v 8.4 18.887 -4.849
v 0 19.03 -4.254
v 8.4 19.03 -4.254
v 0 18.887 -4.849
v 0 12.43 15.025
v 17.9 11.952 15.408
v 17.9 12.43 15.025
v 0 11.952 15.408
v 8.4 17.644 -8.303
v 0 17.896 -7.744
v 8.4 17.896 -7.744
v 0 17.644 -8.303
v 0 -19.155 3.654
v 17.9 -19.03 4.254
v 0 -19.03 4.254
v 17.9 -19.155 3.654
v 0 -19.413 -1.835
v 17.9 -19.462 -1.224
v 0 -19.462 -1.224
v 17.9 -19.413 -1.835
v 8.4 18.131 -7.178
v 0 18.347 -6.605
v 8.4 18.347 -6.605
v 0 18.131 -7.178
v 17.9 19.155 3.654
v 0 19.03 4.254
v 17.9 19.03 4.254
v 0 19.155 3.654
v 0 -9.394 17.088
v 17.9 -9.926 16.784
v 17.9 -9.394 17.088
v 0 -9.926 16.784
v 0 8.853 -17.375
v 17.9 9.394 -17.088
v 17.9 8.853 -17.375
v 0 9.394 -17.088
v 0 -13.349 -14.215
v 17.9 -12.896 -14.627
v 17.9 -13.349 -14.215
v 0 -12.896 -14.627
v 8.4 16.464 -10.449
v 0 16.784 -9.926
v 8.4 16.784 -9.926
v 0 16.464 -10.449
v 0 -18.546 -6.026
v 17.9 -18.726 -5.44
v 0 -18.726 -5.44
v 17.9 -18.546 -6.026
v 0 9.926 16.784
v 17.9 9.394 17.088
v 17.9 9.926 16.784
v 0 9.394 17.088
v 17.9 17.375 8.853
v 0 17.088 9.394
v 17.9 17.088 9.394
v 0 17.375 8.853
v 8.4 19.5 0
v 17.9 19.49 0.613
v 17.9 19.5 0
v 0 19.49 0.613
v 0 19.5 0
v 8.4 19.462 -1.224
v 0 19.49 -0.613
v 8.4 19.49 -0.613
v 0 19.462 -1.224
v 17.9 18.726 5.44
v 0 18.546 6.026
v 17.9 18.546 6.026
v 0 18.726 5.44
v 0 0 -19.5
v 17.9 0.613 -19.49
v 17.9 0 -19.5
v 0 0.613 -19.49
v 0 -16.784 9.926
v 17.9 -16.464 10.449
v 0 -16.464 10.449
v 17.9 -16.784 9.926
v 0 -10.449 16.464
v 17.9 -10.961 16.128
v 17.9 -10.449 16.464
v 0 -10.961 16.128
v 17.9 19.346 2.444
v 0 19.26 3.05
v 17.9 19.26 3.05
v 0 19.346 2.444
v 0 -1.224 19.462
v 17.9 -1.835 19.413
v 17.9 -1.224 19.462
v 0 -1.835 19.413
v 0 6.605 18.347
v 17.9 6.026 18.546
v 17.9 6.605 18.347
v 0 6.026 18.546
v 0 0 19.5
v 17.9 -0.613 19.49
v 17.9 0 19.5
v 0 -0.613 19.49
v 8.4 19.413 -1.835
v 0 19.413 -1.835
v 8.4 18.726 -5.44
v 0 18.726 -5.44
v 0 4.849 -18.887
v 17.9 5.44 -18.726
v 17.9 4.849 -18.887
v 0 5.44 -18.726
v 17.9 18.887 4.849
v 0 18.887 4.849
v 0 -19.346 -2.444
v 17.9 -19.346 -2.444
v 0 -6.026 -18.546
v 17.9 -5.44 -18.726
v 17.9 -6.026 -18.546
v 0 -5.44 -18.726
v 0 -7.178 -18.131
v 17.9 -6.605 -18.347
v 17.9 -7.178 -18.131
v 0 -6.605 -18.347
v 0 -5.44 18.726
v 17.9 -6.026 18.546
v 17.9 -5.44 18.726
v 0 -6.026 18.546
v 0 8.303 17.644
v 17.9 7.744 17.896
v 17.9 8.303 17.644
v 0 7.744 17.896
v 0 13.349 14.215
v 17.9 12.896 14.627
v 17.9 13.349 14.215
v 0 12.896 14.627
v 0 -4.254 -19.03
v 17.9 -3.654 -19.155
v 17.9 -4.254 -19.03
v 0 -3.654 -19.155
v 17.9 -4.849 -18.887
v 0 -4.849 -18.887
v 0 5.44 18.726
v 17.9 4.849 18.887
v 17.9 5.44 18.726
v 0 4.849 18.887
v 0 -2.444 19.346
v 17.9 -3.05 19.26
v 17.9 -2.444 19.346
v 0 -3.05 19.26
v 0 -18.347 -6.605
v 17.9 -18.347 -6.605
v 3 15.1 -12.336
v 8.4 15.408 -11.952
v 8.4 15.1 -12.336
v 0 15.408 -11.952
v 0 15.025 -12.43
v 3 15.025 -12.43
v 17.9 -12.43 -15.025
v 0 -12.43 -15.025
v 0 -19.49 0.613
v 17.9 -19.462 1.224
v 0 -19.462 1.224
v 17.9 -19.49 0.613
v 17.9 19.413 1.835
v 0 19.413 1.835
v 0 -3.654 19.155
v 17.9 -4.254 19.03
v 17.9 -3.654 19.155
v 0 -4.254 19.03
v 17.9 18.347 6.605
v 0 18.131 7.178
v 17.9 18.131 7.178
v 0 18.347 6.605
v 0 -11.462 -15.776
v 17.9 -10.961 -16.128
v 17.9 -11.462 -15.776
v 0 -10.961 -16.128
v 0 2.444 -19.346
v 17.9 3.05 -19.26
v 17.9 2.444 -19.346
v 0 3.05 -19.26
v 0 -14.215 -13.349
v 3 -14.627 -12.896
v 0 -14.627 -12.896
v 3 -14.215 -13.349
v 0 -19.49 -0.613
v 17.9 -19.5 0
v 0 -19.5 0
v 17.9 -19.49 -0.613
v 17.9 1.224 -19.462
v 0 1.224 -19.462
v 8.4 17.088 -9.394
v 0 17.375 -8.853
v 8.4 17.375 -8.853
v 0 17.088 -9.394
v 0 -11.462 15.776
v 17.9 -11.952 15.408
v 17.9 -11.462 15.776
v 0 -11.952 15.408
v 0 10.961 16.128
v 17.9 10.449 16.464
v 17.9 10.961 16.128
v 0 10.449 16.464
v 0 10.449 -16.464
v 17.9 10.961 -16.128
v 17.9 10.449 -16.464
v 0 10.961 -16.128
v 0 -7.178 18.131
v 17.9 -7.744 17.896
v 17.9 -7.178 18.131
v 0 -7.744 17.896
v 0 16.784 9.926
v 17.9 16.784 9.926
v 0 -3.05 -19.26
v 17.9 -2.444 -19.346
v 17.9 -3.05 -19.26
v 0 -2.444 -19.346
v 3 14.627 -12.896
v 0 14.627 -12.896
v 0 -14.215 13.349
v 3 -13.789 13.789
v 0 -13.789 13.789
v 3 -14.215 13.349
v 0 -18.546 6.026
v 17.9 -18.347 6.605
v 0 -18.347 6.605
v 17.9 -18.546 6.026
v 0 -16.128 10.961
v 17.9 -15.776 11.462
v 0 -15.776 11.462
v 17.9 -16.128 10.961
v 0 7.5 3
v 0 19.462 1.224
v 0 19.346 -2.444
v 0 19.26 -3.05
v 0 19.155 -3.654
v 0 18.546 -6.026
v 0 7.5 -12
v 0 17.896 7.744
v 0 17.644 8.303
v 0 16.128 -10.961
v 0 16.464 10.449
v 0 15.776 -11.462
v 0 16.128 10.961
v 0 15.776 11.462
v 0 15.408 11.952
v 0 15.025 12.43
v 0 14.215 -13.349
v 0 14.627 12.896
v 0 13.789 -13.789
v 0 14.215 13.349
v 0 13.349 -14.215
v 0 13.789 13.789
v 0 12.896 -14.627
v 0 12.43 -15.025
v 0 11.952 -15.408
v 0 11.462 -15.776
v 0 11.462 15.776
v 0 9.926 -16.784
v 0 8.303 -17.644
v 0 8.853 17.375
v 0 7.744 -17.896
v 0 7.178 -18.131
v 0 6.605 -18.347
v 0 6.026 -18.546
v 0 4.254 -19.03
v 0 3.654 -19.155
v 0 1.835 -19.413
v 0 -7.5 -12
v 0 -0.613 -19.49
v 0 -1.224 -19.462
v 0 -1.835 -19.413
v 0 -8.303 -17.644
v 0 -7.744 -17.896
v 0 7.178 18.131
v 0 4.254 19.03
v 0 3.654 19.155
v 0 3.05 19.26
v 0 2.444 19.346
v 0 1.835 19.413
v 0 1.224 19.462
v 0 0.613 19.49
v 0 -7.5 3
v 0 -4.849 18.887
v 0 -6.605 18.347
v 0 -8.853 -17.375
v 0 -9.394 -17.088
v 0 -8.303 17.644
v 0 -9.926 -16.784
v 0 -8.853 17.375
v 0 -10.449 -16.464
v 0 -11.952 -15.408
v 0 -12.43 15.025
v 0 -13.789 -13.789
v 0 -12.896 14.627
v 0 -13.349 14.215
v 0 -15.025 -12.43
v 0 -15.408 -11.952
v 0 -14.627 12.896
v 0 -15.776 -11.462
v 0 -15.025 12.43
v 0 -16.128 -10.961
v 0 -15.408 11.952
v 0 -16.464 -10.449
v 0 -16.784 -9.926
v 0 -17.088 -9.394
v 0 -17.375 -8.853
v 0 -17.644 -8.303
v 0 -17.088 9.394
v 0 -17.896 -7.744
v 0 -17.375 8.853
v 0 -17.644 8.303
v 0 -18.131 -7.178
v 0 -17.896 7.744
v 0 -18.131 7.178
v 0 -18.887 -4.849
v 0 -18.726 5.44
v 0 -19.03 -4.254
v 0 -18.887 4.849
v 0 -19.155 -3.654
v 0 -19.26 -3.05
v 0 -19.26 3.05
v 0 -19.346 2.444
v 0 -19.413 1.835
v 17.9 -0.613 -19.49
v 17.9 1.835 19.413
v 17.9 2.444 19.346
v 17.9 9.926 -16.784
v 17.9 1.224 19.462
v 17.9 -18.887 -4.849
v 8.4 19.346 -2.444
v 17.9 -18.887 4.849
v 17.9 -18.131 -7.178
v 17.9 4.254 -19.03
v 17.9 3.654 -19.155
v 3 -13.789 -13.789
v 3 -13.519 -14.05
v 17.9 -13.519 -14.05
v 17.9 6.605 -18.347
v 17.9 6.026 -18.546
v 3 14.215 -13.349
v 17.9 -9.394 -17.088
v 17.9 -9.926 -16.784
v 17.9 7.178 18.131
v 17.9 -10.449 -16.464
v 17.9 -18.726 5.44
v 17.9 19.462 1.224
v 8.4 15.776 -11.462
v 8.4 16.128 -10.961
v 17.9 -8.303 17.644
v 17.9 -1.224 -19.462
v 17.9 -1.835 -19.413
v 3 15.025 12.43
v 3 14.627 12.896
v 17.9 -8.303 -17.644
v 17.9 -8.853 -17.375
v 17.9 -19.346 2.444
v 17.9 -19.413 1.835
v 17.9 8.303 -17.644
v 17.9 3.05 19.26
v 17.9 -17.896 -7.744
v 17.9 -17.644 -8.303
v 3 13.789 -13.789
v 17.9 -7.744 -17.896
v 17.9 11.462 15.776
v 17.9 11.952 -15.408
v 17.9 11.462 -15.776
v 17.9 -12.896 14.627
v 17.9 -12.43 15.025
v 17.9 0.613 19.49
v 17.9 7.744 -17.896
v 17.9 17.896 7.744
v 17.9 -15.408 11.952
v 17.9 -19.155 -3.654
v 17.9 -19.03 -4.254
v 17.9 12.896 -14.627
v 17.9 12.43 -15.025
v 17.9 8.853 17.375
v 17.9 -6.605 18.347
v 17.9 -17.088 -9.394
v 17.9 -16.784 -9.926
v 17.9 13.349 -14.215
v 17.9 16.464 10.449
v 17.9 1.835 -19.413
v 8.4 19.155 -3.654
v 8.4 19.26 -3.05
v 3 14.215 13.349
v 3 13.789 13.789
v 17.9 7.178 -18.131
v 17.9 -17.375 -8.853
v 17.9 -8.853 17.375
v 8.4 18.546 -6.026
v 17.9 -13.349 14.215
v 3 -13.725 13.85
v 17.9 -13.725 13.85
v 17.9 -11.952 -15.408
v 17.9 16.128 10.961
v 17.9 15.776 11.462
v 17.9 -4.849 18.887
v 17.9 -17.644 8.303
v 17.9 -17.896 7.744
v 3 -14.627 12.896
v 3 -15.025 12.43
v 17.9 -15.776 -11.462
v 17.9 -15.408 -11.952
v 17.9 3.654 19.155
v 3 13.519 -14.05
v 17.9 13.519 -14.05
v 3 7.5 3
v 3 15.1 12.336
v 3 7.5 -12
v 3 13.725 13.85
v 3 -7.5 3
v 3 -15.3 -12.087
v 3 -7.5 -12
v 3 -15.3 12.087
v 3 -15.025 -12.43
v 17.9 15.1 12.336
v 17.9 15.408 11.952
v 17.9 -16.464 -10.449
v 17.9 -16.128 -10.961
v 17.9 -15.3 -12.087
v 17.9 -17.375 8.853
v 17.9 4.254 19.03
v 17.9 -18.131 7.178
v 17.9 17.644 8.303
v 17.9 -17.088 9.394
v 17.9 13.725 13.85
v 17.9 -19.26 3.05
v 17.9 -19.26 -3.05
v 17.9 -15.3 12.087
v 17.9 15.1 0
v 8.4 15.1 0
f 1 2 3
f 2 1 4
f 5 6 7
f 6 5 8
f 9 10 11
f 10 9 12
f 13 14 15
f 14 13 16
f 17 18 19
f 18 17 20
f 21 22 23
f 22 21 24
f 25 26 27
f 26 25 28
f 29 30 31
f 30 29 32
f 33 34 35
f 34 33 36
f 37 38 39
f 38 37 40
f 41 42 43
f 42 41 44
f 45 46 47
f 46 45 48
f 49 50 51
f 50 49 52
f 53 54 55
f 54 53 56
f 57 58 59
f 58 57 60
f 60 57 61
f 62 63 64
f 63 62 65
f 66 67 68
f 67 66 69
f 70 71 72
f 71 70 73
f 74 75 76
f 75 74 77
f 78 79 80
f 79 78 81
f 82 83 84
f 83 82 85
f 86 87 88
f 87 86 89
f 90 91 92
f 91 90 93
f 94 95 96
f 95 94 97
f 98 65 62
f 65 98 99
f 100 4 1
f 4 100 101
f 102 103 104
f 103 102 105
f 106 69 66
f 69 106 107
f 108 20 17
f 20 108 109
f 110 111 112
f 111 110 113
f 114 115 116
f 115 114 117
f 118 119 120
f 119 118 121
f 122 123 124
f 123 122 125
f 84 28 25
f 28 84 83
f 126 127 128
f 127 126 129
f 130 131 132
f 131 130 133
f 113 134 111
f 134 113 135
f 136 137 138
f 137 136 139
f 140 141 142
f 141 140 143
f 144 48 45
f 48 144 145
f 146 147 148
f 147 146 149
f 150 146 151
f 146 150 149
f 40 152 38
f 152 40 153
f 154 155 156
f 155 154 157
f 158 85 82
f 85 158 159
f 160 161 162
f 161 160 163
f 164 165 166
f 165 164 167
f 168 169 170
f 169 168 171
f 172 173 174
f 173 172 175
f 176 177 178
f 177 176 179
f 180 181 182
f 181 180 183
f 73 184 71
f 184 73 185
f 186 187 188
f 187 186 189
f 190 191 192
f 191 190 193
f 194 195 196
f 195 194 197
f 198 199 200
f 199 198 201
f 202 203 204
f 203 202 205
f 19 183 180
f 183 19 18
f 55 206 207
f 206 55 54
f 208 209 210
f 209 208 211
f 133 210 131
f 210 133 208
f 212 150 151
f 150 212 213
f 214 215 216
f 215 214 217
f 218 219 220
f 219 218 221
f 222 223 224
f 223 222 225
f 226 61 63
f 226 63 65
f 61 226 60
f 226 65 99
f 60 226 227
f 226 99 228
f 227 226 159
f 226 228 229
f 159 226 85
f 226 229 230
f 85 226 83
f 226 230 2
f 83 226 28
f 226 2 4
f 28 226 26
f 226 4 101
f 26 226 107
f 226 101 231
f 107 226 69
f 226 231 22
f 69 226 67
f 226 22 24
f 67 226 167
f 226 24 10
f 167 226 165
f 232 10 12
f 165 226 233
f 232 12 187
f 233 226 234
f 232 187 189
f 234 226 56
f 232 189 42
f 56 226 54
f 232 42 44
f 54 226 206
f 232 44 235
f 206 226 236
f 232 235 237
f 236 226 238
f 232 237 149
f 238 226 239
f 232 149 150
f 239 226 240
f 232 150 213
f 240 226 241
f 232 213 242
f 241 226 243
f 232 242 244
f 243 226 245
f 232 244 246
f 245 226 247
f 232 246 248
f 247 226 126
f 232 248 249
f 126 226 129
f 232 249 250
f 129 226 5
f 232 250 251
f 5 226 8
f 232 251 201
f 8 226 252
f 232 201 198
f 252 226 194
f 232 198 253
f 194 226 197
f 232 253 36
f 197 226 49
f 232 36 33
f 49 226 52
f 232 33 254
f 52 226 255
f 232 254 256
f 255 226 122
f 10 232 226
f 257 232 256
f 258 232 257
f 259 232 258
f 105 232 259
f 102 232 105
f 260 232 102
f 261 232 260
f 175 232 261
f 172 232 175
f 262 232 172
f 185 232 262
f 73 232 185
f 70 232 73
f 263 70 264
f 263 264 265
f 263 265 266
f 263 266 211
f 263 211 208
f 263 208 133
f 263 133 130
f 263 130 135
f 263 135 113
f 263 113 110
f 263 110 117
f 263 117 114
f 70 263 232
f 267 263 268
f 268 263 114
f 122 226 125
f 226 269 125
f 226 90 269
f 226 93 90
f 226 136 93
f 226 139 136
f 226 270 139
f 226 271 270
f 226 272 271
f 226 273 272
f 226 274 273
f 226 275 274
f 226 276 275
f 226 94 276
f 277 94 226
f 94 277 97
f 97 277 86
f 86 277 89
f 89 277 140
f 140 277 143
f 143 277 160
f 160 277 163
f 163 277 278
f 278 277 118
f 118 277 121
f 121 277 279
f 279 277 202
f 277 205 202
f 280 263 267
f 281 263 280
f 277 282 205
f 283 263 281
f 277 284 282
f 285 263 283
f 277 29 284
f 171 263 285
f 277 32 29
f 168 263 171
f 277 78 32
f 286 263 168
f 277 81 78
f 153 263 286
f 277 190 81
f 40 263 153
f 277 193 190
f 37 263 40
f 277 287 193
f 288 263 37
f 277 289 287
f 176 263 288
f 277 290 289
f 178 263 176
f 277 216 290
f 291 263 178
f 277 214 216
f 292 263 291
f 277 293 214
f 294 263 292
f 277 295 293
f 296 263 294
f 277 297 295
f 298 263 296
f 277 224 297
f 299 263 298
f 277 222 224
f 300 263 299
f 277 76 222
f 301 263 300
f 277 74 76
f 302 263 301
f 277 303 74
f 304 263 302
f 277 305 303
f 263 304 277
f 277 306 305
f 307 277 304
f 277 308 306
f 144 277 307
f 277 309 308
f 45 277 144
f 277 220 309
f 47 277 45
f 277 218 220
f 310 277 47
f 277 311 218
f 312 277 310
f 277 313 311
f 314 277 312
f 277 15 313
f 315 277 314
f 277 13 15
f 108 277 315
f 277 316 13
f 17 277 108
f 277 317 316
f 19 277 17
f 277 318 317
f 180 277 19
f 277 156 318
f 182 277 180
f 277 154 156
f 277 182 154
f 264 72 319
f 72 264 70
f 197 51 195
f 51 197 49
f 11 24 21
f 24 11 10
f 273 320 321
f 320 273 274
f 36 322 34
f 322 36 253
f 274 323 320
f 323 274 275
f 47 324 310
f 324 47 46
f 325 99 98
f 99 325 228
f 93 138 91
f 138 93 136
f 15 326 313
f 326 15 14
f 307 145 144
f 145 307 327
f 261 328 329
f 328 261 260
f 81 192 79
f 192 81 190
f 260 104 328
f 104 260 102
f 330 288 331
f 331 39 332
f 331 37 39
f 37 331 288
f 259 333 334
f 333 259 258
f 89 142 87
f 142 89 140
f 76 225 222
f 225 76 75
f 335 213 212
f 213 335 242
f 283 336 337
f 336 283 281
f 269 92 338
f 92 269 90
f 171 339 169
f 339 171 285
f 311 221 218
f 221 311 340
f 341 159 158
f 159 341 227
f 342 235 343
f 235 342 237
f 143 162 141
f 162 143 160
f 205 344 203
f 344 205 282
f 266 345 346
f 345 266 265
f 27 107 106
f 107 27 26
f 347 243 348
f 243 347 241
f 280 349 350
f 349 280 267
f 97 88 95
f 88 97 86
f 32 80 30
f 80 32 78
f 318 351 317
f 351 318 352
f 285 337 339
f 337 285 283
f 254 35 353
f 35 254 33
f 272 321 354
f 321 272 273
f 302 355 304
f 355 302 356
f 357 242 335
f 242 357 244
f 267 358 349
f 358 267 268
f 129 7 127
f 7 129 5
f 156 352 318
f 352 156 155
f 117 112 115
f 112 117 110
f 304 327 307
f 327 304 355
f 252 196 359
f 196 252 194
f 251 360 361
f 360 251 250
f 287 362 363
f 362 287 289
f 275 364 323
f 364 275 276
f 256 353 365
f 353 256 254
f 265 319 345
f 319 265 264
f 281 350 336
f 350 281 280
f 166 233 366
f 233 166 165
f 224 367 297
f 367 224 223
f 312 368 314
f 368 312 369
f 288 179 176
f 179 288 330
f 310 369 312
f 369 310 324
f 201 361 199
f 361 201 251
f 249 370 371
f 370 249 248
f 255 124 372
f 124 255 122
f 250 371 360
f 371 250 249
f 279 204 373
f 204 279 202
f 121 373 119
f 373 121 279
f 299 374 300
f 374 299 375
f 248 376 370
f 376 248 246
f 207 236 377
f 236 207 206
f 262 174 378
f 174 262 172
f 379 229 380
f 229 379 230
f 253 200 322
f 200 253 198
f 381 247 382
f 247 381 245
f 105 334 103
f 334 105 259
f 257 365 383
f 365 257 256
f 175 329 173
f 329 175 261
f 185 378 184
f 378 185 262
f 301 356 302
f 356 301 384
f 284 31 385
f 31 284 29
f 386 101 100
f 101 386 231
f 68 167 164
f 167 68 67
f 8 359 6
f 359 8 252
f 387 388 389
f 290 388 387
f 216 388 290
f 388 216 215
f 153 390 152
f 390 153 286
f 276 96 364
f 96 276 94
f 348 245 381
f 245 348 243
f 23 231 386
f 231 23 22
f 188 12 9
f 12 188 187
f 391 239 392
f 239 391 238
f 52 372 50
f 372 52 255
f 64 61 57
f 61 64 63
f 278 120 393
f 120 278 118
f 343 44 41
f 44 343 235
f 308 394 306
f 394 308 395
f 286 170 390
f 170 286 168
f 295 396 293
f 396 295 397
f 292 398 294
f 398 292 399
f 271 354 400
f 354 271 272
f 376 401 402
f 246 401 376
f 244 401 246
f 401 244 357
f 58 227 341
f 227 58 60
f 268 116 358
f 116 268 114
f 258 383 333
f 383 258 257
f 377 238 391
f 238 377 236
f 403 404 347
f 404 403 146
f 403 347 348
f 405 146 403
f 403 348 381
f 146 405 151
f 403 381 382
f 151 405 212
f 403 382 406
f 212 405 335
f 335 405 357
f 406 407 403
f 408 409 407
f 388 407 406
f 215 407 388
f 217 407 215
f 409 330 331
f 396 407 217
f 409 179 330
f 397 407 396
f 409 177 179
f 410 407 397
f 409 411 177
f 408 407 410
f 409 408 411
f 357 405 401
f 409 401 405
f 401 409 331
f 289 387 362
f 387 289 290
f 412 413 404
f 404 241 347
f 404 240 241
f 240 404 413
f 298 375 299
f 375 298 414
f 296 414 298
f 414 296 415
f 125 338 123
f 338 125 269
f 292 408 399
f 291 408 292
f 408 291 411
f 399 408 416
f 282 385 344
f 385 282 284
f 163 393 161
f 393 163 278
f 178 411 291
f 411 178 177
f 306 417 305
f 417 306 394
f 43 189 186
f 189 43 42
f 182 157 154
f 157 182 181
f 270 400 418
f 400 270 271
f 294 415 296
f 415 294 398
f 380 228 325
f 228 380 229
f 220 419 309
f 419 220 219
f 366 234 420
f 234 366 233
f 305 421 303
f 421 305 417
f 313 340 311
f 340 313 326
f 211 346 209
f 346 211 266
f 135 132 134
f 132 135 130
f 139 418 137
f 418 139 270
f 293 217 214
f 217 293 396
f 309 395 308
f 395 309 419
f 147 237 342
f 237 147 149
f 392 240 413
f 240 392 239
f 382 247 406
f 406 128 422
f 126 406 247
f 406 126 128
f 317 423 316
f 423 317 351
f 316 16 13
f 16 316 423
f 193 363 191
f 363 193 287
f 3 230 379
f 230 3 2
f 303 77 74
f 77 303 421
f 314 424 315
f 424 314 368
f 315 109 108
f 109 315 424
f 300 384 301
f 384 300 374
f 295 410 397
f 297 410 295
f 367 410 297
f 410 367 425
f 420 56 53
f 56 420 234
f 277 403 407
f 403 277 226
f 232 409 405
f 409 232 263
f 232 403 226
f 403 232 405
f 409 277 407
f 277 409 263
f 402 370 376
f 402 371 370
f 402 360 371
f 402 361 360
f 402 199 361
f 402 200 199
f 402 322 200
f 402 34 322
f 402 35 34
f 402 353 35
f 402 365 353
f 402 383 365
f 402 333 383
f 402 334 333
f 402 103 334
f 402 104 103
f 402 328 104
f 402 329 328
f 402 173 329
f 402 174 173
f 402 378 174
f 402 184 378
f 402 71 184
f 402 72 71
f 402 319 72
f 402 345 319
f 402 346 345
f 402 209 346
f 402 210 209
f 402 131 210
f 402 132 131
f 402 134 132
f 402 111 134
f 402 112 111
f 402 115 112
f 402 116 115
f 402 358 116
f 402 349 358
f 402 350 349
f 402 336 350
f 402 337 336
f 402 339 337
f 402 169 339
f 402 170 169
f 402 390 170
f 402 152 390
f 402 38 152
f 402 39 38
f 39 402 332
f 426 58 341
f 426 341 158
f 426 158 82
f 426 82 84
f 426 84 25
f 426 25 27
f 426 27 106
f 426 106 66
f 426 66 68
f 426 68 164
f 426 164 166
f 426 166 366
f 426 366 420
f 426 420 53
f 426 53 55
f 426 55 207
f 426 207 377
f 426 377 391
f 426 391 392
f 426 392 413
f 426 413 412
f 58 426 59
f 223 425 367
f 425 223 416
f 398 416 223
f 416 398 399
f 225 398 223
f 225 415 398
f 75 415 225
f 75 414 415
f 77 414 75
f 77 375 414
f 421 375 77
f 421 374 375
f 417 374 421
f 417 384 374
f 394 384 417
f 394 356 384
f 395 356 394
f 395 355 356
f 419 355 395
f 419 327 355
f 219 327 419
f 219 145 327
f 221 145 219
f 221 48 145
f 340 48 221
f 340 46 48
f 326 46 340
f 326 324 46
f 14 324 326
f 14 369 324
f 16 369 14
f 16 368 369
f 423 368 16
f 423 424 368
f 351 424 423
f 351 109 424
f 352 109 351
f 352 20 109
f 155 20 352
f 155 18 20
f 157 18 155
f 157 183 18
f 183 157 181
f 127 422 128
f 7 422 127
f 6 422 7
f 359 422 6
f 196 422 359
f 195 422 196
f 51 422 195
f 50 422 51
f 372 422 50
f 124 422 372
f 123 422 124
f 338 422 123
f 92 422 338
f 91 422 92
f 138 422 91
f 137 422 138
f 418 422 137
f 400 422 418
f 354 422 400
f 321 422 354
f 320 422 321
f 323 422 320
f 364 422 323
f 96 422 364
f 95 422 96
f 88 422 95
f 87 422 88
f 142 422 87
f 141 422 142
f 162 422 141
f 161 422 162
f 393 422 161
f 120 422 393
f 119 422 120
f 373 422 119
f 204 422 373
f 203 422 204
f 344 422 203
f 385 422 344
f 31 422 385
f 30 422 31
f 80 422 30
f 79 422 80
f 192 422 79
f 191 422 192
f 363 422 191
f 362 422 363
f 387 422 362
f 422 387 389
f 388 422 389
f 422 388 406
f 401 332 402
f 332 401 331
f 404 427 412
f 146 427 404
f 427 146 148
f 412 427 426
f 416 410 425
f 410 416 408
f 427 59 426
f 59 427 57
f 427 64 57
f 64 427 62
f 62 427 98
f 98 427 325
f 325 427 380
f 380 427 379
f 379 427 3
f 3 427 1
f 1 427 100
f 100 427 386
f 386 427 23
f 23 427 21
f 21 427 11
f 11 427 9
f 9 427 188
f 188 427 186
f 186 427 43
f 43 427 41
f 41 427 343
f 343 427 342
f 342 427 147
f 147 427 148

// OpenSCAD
WALL_THICK = 2;
FEATHER_LENGTH = 54;
FEATHER_HEIGHT = 24;
FEATHER_WIDTH = 26.5;

EXTREME_SIZE = 100;

module tube(length)
{
	rotate(90,[0,1,0])
	cylinder(h=length, r=39/2);
}

module featherFrameKeepout()
{
	//difference()
	//{
		

		translate([0,-FEATHER_WIDTH/2, -FEATHER_HEIGHT/2])
		cube([FEATHER_LENGTH, FEATHER_WIDTH, FEATHER_HEIGHT]);
	//}

	translate([-10,WALL_THICK / 2, FEATHER_HEIGHT/2+WALL_THICK])
	cube([EXTREME_SIZE, EXTREME_SIZE, EXTREME_SIZE]);
	
	translate([-10,-EXTREME_SIZE - WALL_THICK / 2, FEATHER_HEIGHT/2+WALL_THICK])
	cube([EXTREME_SIZE, EXTREME_SIZE, EXTREME_SIZE]);

}

module feather_holder()
{
    difference()
    {
        translate([-WALL_THICK, -WALL_THICK, -WALL_THICK])
        cube([FEATHER_LENGTH + 2 * WALL_THICK, 
              FEATHER_WIDTH + 2 * WALL_THICK, 
              FEATHER_HEIGHT + 2 * WALL_THICK]);
        
        cube([FEATHER_LENGTH, FEATHER_WIDTH, FEATHER_HEIGHT]);
    }
}

module feather_frame_area(length)
{
    difference()
    {
        tube(length);
        
        translate([-1, 
               -(FEATHER_WIDTH + 2 * WALL_THICK)/2 - 0.05,
               -(FEATHER_HEIGHT + 2 * WALL_THICK)/2 - 0.05])
            cube([FEATHER_LENGTH + 2 * WALL_THICK+2, 
                  FEATHER_WIDTH + 2 * WALL_THICK-.1, 
                  FEATHER_HEIGHT + 2 * WALL_THICK-.1]);
        
        translate([5.5, 0, -FEATHER_HEIGHT/2-.5]) 
        cube([12,100,12.5]);
    }
}

module antenna_plate()
{
    difference()
    {
        rotate(90,[0,1,0])
        cylinder(h=6, d=39);
    
        // skirt
        translate([2,0,0])
        rotate(90,[0,1,0])
        cylinder(h=8, d=(39 - 2*WALL_THICK));
        
        // antenna mont
        translate([-2,0,0])
        rotate(90,[0,1,0])
        cylinder(h=6, d=6.5);
    }
}

module front_collar()
{
    rotate(90,[0,1,0])
    rotate_extrude($fn=200)
    polygon( points=[[39/2, 0],[39/2, 7],[39/2 - 10, 7],[39/2 - 10, 5],[39/2-2, 0],[39/2,0]] );
}


module top_assembly()
{
    antenna_plate();
    
    translate([5.9,0,0])
    front_collar();
    
    translate([12.8,0,0])
    feather_frame_area(15);
}

module bottom_plate()
{
    difference()
    {
        rotate(90,[0,1,0])
            cylinder(h=3, d=39);
        
        
        translate([-1,-7.5,-12])
        cube([5, 15,15]);
        
        
        
        
    }
}

module bottom_assembly()
{
    bottom_plate();
    
    translate([2.9,0,0])
    feather_frame_area(15);
}


//top_assembly();
bottom_assembly();

$fn=200;
